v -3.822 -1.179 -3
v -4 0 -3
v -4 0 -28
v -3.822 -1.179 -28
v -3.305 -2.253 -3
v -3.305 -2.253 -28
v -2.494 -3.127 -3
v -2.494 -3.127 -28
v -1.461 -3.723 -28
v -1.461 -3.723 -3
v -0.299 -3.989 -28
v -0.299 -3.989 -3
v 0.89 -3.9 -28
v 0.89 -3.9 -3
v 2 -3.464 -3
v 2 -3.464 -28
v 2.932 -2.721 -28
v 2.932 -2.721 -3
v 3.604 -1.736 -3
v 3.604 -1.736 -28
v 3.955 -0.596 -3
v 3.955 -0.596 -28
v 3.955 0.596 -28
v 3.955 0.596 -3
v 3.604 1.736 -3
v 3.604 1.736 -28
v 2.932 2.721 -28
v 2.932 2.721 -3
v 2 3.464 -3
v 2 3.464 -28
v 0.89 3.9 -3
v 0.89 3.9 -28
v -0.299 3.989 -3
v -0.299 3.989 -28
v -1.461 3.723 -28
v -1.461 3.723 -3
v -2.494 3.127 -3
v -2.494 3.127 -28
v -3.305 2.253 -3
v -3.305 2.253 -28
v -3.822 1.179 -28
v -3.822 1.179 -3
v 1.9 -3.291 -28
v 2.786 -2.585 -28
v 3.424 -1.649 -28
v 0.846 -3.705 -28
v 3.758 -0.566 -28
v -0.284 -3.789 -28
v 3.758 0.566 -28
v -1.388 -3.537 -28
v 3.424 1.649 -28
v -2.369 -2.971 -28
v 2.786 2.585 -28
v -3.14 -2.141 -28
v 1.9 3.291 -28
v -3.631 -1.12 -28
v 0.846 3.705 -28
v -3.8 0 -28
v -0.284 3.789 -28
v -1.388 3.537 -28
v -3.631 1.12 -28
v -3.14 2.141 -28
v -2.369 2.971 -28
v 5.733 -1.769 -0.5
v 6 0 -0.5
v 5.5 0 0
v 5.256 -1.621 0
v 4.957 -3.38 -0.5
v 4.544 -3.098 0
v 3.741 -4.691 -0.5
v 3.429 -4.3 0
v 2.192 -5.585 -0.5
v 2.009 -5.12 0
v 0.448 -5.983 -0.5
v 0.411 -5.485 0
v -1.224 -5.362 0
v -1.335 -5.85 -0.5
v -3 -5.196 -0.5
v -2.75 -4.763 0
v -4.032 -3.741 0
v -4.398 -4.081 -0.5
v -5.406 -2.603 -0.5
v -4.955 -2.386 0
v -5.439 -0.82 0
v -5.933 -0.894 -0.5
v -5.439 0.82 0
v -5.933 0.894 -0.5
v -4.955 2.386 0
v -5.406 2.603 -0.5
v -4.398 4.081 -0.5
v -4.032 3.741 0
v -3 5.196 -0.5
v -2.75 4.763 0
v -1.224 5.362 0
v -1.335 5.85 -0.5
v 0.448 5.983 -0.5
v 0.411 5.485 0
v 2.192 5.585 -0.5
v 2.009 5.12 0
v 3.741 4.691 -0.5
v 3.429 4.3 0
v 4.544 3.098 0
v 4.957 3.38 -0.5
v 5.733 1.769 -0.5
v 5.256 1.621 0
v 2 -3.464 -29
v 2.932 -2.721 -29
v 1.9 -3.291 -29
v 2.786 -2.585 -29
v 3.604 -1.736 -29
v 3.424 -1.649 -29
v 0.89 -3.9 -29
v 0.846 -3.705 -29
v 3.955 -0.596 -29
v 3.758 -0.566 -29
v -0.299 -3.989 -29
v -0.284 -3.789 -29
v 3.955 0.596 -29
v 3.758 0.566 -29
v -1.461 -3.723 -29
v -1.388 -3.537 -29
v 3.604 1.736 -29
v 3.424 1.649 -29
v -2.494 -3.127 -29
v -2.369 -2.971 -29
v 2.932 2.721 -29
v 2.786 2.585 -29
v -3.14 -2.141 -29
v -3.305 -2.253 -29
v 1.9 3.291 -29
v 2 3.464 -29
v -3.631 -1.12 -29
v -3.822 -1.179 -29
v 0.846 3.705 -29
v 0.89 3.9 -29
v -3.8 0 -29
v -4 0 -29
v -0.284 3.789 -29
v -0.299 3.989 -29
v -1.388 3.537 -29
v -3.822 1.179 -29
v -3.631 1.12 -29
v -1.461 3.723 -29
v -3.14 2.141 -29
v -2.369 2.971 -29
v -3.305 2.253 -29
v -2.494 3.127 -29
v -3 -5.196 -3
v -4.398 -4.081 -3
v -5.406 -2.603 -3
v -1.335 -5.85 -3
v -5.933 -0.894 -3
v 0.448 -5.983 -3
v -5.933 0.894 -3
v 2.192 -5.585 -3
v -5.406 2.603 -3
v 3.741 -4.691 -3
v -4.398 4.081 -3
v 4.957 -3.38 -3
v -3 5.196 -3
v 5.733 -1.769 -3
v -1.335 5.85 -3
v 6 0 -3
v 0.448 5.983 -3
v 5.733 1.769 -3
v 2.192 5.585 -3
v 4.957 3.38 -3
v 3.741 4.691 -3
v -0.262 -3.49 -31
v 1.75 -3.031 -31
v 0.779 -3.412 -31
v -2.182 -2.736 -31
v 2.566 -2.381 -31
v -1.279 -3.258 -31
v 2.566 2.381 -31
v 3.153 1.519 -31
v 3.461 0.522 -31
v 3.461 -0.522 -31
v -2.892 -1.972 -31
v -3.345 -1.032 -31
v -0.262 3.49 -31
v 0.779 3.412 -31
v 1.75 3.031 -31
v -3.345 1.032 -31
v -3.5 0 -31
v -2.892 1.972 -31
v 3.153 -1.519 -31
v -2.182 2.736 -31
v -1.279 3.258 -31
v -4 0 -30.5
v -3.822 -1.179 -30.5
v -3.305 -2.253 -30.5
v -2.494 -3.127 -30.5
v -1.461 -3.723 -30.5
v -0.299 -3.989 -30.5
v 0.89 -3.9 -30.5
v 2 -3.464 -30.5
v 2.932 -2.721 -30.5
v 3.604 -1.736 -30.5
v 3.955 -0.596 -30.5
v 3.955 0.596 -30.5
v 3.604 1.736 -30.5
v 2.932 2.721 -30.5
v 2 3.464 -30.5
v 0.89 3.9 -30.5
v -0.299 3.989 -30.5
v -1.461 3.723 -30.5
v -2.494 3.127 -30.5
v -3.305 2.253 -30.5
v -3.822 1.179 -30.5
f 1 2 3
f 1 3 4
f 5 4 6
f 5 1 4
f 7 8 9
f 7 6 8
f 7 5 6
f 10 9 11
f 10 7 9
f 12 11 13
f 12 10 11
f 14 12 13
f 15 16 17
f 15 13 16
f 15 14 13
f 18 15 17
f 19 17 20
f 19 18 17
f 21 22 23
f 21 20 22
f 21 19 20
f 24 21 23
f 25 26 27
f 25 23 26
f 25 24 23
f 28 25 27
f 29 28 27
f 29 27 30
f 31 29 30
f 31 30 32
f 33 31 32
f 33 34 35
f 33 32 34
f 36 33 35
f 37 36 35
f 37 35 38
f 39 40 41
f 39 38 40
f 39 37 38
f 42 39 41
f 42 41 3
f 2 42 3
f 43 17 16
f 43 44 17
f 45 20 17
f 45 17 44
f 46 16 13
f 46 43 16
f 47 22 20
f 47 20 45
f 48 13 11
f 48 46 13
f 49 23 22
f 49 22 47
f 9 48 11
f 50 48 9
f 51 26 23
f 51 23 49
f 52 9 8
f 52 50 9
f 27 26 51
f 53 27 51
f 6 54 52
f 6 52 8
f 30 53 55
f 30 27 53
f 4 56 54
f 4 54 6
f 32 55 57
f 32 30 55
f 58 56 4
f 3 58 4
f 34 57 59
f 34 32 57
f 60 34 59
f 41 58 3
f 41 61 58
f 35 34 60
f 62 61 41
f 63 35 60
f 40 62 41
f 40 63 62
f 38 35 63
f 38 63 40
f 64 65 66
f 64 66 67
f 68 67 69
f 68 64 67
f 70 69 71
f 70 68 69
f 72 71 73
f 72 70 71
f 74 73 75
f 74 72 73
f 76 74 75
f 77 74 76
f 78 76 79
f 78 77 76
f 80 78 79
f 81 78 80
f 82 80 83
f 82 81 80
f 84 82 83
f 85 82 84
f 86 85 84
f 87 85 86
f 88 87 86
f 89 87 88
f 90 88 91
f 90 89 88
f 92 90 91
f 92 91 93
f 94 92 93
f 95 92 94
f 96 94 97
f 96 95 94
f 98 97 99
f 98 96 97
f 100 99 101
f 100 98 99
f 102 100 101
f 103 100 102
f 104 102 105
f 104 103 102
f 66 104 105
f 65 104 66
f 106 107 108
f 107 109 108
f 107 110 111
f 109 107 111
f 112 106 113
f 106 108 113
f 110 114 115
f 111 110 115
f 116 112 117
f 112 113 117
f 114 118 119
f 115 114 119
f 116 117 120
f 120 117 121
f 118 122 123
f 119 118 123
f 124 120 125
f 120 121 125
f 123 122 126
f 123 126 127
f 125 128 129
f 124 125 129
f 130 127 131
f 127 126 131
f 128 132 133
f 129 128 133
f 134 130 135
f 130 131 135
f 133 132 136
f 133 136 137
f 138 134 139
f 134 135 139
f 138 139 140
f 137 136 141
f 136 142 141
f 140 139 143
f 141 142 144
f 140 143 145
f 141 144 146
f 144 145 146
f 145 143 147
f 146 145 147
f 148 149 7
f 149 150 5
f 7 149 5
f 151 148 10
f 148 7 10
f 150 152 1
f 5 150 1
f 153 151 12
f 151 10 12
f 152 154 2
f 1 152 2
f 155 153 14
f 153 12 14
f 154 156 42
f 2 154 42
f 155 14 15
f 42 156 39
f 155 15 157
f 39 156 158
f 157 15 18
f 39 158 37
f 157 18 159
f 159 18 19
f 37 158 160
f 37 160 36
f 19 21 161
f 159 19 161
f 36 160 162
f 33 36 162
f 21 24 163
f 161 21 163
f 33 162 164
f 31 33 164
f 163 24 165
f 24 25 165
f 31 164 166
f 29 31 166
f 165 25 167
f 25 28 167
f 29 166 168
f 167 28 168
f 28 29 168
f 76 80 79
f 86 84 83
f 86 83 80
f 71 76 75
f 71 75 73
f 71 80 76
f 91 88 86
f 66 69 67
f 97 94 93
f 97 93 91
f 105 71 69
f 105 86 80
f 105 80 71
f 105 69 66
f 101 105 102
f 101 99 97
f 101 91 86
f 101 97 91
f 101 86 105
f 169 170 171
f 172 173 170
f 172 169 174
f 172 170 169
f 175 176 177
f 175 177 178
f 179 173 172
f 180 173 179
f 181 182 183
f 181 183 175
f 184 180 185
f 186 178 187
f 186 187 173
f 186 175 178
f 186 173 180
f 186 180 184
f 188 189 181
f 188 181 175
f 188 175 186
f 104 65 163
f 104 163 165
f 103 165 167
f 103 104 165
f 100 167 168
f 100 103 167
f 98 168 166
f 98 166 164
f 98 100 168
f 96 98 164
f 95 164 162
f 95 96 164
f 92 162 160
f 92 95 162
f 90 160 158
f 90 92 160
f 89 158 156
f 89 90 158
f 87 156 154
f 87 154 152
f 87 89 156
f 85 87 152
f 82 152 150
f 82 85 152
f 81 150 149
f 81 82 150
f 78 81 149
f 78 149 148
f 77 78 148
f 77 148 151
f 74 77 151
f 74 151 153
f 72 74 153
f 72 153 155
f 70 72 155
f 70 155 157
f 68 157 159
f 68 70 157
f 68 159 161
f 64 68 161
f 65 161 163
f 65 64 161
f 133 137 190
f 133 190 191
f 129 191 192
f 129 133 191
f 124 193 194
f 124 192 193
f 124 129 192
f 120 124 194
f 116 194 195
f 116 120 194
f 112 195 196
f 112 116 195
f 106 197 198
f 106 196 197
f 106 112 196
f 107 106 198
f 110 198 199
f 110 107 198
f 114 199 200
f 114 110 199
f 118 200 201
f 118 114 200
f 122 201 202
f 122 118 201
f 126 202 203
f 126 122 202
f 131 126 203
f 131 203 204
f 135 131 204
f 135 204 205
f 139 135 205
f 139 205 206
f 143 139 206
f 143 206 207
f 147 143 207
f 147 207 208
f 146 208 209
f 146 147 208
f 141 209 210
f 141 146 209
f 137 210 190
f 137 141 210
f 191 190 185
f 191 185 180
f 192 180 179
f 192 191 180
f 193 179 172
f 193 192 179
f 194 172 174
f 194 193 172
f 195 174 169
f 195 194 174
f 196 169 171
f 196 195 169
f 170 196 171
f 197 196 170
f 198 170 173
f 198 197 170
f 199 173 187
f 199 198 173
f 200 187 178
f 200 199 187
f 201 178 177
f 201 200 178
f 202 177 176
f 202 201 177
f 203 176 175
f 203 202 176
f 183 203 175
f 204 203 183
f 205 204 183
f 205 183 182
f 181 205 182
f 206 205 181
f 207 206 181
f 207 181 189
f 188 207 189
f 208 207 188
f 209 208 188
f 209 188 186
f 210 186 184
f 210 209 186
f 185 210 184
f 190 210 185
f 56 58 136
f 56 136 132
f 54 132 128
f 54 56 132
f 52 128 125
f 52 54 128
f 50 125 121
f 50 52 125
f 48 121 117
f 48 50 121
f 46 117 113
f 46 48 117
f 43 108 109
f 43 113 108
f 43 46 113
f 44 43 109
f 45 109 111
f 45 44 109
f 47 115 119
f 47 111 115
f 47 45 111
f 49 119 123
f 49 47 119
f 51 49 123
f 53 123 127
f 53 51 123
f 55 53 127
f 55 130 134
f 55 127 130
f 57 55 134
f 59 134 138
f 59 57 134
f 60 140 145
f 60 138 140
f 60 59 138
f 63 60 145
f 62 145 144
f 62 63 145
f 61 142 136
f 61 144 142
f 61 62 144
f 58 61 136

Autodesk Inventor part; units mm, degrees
ref_plane "YZ Plane" through (0, 0, 0) normal (1, 0, 0) x (0, 1, 0)
ref_plane "XZ Plane" through (0, 0, 0) normal (0, 1, 0) x (-1, 0, 0)
ref_plane "XY Plane" through (0, 0, 0) normal (0, 0, 1) x (1, 0, 0)
sketch "Sketch1" plane through (0, 0, 0) normal (0, 0, 1) x (1, 0, 0)
  circle A0 centre (0, 0) radius 6
  dimension "d0" = 12
extrude "Extrusion1" add sketch "Sketch1" against normal blind 3
chamfer "Chamfer1" distance 0.5 angle 45 1 edges at (-6, 0, 0) measured on face at (5.9805, -0.4828, -2)
sketch "Sketch2" plane through (0, 0, -3) normal (0, 0, -1) x (-1, 0, 0)
  circle A0 centre (0, 0) radius 4
  dimension "d6" = 8
extrude "Extrusion2" add sketch "Sketch2" along normal blind 25
sketch "Sketch3" plane through (0, 0, -28) normal (0, 0, -1) x (-1, 0, 0)
  circle A0 centre (0, 0) radius 3.8
  dimension "d9" = 7.6
extrude "Extrusion3" add sketch "Sketch3" along normal blind 1
sketch "Sketch4" plane through (0, 0, -29) normal (0, 0, -1) x (-1, 0, 0)
  circle A0 centre (0, 0) radius 4
extrude "Extrusion4" add sketch "Sketch4" along normal blind 2
chamfer "Chamfer2" distance 0.5 angle 45 1 edges at (4, 0, -31)
properties part number "Bolt"
